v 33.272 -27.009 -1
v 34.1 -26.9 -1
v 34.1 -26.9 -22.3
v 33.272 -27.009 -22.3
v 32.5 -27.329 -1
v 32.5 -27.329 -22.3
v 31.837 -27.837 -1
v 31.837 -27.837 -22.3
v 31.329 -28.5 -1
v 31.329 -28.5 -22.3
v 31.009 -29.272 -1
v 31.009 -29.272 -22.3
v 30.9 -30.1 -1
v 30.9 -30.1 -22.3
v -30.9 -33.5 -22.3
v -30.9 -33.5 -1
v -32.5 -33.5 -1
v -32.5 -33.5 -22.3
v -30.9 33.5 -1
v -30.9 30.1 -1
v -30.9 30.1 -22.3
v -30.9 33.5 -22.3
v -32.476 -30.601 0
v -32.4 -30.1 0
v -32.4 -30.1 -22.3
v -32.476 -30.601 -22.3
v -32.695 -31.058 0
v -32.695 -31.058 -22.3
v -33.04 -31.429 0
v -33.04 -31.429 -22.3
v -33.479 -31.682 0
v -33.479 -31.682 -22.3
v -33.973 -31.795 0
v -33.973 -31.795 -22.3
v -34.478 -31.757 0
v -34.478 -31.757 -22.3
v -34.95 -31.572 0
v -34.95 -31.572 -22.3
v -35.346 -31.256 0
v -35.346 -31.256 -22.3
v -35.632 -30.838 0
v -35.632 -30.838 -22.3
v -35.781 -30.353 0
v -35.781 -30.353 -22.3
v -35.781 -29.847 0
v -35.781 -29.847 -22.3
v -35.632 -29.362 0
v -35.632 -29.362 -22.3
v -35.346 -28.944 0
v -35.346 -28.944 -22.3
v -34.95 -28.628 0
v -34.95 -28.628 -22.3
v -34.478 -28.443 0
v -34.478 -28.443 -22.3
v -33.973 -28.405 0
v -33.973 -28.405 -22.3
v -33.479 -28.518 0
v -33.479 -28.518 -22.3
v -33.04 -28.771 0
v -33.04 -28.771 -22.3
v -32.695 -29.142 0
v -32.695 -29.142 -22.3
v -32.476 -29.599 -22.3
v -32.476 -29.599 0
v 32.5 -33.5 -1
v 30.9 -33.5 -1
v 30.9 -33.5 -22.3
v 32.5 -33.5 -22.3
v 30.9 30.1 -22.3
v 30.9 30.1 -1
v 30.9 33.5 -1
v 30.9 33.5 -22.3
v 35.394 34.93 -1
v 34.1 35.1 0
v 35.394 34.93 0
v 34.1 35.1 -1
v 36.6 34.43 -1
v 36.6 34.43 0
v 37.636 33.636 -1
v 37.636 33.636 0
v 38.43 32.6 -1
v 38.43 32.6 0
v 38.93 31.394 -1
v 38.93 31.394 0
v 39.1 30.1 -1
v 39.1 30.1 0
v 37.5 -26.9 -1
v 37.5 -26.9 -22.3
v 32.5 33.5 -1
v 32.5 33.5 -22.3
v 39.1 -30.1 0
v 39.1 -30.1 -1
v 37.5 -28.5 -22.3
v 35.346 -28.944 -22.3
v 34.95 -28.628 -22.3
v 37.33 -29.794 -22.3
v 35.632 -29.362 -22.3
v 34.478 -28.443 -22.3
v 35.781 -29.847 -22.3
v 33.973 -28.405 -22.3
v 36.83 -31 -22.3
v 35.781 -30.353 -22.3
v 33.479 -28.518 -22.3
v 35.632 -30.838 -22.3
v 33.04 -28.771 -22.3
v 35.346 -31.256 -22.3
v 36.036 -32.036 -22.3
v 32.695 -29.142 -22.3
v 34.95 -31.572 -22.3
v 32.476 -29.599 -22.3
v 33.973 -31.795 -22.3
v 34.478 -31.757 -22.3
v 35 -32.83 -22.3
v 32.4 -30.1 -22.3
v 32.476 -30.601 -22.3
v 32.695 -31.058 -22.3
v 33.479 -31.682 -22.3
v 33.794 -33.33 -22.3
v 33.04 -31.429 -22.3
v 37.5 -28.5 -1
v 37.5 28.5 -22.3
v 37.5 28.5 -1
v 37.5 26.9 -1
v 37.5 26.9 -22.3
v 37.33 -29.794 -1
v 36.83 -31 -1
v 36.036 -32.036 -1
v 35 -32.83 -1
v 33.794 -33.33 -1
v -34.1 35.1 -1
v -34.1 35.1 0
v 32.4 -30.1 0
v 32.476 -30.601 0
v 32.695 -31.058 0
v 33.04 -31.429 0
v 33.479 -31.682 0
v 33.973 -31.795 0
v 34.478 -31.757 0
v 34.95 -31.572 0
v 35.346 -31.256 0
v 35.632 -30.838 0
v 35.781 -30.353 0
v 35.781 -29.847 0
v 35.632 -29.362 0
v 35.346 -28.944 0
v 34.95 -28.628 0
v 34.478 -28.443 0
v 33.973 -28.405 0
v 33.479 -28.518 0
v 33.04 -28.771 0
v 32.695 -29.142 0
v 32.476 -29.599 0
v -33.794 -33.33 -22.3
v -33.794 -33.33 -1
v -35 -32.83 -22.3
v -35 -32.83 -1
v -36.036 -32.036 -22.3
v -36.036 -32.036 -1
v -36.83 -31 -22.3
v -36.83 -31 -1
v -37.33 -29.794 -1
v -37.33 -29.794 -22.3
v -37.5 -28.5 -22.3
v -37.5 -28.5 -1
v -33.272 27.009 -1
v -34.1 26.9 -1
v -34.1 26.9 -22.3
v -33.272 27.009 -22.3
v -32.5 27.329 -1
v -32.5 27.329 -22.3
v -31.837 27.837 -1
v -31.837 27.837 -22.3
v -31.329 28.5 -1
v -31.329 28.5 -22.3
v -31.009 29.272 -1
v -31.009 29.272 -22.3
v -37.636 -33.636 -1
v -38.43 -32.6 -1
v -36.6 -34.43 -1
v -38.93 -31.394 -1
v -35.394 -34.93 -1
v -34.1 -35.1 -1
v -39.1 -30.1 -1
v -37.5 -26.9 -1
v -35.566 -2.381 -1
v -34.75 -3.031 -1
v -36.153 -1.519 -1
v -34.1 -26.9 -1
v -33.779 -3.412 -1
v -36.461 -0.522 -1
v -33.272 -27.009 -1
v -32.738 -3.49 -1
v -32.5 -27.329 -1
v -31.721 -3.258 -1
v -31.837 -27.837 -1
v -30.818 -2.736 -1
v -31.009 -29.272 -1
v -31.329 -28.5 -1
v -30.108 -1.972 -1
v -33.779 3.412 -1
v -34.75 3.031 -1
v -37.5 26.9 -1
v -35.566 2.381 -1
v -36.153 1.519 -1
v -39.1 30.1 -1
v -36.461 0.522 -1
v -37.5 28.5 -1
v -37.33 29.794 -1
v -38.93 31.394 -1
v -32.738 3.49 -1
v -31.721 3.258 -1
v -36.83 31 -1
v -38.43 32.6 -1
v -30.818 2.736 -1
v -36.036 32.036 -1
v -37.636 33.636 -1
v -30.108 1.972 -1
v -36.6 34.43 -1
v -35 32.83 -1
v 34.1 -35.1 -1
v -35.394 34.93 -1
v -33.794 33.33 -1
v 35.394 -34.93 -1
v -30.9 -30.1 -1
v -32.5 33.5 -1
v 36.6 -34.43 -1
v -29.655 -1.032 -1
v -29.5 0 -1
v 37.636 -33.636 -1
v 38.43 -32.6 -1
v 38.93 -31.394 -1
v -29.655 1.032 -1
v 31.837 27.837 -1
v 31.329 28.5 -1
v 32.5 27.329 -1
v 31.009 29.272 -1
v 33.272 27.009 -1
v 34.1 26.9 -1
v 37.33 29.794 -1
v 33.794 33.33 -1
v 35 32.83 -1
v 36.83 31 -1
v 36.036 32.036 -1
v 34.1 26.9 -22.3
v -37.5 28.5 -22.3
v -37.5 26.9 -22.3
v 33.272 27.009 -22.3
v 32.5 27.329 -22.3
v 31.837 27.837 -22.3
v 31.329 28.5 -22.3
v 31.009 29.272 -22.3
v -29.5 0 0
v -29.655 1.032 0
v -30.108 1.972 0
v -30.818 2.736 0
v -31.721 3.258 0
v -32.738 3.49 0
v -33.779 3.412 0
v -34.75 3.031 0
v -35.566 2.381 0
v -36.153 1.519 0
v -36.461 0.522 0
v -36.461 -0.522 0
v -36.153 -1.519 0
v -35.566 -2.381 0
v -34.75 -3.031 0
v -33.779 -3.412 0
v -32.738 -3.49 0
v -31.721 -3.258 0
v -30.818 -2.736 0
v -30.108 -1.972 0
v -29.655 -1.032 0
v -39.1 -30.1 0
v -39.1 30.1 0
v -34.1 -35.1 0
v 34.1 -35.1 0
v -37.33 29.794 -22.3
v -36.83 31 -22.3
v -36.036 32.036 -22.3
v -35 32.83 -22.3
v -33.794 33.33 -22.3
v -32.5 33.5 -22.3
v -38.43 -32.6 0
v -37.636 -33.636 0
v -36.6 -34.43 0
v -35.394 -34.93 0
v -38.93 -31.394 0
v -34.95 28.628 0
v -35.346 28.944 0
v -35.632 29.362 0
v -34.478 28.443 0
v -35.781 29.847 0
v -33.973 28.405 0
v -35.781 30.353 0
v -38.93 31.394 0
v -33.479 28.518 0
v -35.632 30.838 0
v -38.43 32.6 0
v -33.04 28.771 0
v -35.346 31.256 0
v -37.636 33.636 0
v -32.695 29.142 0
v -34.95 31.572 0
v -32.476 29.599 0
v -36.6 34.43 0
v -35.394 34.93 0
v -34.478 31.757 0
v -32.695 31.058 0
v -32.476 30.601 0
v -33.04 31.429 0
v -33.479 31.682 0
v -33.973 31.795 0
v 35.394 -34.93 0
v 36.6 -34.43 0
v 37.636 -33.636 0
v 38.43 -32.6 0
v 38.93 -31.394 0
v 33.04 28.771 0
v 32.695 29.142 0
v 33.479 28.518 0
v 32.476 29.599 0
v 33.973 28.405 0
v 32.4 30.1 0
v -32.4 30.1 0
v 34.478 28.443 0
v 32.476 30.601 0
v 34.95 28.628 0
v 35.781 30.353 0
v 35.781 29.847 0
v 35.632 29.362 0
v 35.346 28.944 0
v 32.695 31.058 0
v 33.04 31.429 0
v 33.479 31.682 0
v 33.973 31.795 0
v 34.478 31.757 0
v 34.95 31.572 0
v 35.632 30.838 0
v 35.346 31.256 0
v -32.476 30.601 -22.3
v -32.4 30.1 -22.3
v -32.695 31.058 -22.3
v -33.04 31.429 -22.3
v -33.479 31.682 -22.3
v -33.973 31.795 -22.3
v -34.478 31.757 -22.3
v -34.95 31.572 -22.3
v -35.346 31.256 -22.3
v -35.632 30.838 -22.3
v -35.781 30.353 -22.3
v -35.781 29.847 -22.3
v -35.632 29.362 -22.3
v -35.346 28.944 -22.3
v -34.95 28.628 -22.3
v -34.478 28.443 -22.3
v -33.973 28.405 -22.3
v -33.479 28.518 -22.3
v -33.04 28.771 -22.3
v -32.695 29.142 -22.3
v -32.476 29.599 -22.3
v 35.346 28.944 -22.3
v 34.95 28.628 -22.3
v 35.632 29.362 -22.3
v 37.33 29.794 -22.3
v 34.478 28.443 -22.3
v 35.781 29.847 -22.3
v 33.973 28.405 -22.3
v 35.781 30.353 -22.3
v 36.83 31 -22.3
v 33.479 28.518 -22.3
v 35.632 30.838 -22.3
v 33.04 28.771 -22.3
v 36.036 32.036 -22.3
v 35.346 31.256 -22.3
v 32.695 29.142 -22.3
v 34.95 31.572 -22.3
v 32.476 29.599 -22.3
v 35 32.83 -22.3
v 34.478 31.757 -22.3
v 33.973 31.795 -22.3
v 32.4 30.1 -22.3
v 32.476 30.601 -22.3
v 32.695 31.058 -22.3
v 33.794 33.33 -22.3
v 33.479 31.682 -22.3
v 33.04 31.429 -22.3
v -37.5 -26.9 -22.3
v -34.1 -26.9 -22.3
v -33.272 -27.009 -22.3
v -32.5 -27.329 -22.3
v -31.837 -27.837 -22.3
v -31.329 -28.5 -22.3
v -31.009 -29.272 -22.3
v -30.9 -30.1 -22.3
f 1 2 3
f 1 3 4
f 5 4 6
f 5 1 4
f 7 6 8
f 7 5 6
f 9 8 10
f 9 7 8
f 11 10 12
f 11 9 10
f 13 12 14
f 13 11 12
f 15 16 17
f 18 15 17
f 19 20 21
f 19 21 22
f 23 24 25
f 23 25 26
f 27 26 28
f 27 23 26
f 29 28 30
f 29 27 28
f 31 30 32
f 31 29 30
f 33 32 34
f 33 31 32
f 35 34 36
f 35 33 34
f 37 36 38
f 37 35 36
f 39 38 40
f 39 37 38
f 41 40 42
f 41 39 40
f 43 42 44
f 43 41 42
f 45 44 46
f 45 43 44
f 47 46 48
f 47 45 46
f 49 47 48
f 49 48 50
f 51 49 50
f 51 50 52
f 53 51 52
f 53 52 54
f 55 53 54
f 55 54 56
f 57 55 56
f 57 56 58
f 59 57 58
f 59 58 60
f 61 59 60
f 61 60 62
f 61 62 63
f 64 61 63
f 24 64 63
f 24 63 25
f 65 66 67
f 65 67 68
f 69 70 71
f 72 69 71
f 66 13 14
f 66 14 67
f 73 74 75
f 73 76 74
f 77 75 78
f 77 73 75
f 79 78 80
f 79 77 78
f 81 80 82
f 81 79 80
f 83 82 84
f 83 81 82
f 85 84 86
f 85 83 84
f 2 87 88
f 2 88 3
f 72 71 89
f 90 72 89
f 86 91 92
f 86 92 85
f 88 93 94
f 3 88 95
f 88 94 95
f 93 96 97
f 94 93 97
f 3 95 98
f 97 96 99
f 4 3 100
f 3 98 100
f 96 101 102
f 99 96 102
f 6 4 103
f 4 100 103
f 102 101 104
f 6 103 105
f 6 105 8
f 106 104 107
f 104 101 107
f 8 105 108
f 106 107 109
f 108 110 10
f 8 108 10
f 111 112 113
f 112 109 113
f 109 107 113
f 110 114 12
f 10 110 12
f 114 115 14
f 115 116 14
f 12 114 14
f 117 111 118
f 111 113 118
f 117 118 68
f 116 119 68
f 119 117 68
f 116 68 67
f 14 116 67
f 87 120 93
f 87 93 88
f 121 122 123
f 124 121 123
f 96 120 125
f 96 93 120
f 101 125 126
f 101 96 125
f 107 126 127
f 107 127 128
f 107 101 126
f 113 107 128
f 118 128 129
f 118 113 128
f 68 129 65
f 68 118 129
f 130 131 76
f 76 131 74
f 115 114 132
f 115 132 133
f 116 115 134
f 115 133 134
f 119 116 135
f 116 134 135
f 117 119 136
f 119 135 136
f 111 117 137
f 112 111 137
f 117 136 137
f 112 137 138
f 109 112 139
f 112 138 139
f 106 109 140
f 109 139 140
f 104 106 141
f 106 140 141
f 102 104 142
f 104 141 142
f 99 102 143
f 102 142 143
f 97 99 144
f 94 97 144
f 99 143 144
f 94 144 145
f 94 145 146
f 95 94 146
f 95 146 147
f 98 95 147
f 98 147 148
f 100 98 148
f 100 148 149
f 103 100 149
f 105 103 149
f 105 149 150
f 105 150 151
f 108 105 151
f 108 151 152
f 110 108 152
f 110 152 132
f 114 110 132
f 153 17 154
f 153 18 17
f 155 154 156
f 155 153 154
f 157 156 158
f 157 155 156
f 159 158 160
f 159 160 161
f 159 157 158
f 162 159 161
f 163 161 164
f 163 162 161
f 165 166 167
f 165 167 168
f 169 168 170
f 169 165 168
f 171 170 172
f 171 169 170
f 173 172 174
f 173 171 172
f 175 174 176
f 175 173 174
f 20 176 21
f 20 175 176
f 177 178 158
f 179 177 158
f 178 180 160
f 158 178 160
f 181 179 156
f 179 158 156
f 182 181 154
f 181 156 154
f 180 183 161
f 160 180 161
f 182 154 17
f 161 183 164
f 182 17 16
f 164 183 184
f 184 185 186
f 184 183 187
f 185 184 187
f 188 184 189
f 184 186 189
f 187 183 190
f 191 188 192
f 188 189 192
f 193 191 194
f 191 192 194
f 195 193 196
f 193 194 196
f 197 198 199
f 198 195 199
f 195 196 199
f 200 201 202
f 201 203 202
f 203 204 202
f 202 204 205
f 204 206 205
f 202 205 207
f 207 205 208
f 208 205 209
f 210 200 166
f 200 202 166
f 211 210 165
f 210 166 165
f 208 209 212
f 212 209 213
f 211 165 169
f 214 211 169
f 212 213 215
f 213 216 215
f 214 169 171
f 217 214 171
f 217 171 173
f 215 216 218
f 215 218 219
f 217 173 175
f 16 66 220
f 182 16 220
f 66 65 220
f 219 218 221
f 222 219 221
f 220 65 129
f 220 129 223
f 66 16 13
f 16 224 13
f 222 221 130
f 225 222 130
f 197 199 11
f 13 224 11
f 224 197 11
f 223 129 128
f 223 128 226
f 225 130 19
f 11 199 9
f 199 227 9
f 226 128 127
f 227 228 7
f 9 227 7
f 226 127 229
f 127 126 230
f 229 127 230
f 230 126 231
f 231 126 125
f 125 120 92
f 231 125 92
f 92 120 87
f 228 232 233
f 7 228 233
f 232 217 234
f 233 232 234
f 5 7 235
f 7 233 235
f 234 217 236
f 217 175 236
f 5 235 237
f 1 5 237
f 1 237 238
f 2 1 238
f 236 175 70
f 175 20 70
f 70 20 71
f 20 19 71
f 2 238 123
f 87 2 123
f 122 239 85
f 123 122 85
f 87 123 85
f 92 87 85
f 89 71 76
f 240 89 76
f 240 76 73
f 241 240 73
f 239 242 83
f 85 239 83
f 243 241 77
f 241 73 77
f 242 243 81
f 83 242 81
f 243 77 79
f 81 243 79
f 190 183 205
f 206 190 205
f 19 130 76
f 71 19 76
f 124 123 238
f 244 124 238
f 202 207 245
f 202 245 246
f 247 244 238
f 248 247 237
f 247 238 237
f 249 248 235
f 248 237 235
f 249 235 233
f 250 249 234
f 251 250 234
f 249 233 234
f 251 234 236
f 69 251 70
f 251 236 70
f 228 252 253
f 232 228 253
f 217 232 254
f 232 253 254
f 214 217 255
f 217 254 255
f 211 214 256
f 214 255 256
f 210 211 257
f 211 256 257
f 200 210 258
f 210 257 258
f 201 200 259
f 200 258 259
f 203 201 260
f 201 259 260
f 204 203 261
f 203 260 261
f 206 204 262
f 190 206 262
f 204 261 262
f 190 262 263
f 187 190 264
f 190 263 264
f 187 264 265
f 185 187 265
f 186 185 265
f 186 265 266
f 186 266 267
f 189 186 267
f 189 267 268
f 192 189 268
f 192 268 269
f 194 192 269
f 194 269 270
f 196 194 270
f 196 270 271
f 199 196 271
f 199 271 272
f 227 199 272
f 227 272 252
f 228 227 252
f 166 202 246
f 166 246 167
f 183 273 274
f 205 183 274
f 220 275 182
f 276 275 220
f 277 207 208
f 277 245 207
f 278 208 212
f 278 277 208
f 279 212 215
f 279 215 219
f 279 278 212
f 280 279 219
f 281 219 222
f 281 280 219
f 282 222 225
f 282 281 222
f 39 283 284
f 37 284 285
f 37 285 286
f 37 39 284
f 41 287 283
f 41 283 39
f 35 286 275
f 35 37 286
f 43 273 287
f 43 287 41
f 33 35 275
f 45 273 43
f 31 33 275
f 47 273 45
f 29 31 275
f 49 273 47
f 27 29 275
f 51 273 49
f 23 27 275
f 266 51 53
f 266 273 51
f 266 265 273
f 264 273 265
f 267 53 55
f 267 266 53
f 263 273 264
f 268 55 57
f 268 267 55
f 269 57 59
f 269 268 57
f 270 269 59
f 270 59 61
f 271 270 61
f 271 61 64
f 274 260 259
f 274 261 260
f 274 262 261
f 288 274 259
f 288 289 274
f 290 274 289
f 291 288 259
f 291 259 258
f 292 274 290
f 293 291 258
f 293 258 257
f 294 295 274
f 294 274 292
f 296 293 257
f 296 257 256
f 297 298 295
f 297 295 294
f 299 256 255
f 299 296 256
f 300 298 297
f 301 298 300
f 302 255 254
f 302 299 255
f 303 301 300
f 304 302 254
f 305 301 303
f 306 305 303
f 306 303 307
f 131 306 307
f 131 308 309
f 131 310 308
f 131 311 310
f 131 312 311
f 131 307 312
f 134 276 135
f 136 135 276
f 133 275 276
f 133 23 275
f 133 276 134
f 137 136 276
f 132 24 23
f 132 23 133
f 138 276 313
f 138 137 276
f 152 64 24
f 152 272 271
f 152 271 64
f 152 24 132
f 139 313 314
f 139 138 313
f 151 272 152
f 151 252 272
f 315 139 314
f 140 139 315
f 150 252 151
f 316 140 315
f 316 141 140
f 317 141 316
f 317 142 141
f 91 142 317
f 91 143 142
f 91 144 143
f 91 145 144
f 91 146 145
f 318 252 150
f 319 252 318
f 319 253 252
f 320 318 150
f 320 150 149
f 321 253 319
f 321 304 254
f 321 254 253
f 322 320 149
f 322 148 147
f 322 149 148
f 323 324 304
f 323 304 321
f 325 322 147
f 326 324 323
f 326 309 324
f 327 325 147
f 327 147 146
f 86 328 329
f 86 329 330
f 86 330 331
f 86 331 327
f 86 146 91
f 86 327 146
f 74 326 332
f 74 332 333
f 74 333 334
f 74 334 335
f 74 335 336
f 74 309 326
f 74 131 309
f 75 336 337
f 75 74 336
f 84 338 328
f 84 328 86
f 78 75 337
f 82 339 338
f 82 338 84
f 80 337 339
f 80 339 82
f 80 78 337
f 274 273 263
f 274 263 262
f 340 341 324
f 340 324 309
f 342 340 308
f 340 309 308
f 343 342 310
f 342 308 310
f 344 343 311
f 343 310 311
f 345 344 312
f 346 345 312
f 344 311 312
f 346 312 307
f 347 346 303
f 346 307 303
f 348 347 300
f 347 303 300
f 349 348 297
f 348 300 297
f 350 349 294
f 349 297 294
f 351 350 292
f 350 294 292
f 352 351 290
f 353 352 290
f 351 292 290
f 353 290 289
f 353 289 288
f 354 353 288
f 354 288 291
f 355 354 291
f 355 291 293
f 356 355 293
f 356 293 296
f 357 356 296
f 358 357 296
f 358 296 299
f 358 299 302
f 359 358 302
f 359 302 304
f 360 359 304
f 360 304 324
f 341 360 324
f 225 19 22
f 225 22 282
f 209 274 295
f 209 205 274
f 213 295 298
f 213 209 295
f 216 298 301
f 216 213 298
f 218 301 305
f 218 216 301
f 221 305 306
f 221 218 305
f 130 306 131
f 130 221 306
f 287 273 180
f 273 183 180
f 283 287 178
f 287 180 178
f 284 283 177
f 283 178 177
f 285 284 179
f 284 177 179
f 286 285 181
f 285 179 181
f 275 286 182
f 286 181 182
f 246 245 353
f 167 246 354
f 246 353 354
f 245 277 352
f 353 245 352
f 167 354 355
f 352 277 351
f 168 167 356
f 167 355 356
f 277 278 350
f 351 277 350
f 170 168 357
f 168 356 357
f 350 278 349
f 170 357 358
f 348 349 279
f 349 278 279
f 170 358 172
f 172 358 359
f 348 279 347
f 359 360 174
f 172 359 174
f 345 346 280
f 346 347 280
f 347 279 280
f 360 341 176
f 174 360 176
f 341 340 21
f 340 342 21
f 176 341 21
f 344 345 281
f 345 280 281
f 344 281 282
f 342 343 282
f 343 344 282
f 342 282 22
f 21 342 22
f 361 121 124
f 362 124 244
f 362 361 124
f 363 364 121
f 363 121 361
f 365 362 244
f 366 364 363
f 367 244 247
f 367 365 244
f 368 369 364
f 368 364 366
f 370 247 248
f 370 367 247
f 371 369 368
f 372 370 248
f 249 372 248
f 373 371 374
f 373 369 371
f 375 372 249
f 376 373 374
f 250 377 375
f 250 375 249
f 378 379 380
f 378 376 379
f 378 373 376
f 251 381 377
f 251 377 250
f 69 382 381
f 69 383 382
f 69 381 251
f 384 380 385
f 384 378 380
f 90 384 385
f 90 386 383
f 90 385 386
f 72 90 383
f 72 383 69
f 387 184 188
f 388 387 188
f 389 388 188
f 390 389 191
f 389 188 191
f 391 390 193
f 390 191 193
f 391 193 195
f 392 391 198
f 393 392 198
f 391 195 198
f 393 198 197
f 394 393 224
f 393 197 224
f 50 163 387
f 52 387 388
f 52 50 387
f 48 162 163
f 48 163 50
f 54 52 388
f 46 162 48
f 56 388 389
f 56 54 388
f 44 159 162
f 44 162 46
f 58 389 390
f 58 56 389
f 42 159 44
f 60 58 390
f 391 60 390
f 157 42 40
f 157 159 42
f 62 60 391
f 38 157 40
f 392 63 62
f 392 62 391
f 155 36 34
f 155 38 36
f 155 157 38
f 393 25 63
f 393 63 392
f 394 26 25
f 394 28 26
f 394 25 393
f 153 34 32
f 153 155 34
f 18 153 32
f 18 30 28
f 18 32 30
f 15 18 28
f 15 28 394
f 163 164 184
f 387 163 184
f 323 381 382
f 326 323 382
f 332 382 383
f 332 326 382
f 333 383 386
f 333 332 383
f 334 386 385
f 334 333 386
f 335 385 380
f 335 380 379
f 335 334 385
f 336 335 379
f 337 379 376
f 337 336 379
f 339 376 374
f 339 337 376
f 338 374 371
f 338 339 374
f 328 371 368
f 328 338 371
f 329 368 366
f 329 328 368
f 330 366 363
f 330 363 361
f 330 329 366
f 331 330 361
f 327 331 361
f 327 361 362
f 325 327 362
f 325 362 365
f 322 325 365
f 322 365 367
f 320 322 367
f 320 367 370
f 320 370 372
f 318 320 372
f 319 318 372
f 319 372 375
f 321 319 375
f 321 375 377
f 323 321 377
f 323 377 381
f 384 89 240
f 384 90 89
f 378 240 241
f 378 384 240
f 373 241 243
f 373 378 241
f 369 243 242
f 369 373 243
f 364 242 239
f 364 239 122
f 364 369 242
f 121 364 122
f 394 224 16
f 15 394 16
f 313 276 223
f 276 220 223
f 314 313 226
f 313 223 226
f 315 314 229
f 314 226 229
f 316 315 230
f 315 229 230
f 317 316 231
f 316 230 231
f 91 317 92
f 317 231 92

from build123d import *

# Parameters (mm, degrees)
SKETCH006_W                        = 78.2
SKETCH006_H                        = 70.2
PAD004_DEPTH                       = 1
SKETCH011_R                        = 1.7
POCKET004_DEPTH                    = 211.184539
POCKET004_DEPTH_BACK               = 210.184539
SKETCH011_MIRRORED009_2_R          = 1.7
POCKET004_MIRRORED009_2_DEPTH      = 211.184539
POCKET004_MIRRORED009_2_DEPTH_BACK = -210.184539
SKETCH015_R                        = 1.7
PAD008_DEPTH                       = 22.3
SKETCH015_MIRRORED017_2_R          = 1.7
PAD008_MIRRORED017_2_DEPTH         = 22.3
SKETCH023_R                        = 3.5
POCKET014_DEPTH                    = 5
FILLET003_R                        = 5


with BuildPart() as part:
    # Sketch006 → Pad004 (new body)
    with BuildSketch(Plane.XY):
        Rectangle(SKETCH006_W, SKETCH006_H)
    extrude(amount=-PAD004_DEPTH)

    # Sketch011 → Pocket004 (cut, two sides)
    with BuildSketch(Plane.XY) as pocket004_sk:
        with Locations((-34.1, 30.1)):
            Circle(SKETCH011_R)
    pocket004 = extrude(amount=-POCKET004_DEPTH, mode=Mode.SUBTRACT) + extrude(pocket004_sk.sketch, amount=POCKET004_DEPTH_BACK, mode=Mode.SUBTRACT)

    # Sketch011 Mirrored009 2 → Pocket004 Mirrored009 2 (cut, two sides)
    with BuildSketch(Plane(origin=(0, 0, 0), x_dir=(-1, 0, 0), z_dir=(0, 0, -1))) as pocket004_mirrored009_2_sk:
        with Locations((-34.1, 30.1)):
            Circle(SKETCH011_MIRRORED009_2_R)
    pocket004_mirrored009_2 = extrude(amount=POCKET004_MIRRORED009_2_DEPTH, mode=Mode.SUBTRACT) + extrude(pocket004_mirrored009_2_sk.sketch, amount=-POCKET004_MIRRORED009_2_DEPTH_BACK, mode=Mode.SUBTRACT)

    # Mirrored010: Pocket004, Pocket004 Mirrored009 2 across Sketch011 H_Axis
    add(pocket004.mirror(Plane.ZX), mode=Mode.SUBTRACT)
    add(pocket004_mirrored009_2.mirror(Plane.ZX), mode=Mode.SUBTRACT)

    # Sketch015 → Pad008 (join)
    with BuildSketch(Plane.XY):
        with BuildLine():
            ThreePointArc((-34.1, 26.9), (-31.837258, 27.837258), (-30.9, 30.1))
            Line((-30.9, 30.1), (-30.9, 33.5))
            Line((-30.9, 33.5), (-37.5, 33.5))
            Line((-37.5, 33.5), (-37.5, 26.9))
            Line((-37.5, 26.9), (-34.1, 26.9))
        make_face()
        with Locations((-34.1, 30.1)):
            Circle(SKETCH015_R, mode=Mode.SUBTRACT)
    pad008 = extrude(amount=-PAD008_DEPTH)

    # Sketch015 Mirrored017 2 → Pad008 Mirrored017 2 (add)
    with BuildSketch(Plane(origin=(0, 0, 0), x_dir=(-1, 0, 0), z_dir=(0, 0, -1))):
        with BuildLine():
            ThreePointArc((-34.1, 26.9), (-31.837258, 27.837258), (-30.9, 30.1))
            Line((-30.9, 30.1), (-30.9, 33.5))
            Line((-30.9, 33.5), (-37.5, 33.5))
            Line((-37.5, 33.5), (-37.5, 26.9))
            Line((-37.5, 26.9), (-34.1, 26.9))
        make_face()
        with Locations((-34.1, 30.1)):
            Circle(SKETCH015_MIRRORED017_2_R, mode=Mode.SUBTRACT)
    pad008_mirrored017_2 = extrude(amount=PAD008_MIRRORED017_2_DEPTH)

    # Mirrored018: Pad008, Pad008 Mirrored017 2 across Sketch015 H_Axis
    add(pad008.mirror(Plane.ZX))
    add(pad008_mirrored017_2.mirror(Plane.ZX))

    # Sketch023 → Pocket014 (cut)
    with BuildSketch(Plane.XY):
        with Locations((-33, 0)):
            Circle(SKETCH023_R)
    extrude(amount=-POCKET014_DEPTH, mode=Mode.SUBTRACT)

    # Fillet003
    fillet003_edges = [part.edges().sort_by_distance(p)[0] for p in [
        (37.5, 33.5, -11.65),
        (39.1, 35.1, -0.5),
        (37.5, -33.5, -11.65),
        (39.1, -35.1, -0.5),
        (-39.1, -35.1, -0.5),
        (-37.5, -33.5, -11.65),
        (-37.5, 33.5, -11.65),
        (-39.1, 35.1, -0.5),
    ]]
    fillet(fillet003_edges, radius=FILLET003_R)


solid = part.part
